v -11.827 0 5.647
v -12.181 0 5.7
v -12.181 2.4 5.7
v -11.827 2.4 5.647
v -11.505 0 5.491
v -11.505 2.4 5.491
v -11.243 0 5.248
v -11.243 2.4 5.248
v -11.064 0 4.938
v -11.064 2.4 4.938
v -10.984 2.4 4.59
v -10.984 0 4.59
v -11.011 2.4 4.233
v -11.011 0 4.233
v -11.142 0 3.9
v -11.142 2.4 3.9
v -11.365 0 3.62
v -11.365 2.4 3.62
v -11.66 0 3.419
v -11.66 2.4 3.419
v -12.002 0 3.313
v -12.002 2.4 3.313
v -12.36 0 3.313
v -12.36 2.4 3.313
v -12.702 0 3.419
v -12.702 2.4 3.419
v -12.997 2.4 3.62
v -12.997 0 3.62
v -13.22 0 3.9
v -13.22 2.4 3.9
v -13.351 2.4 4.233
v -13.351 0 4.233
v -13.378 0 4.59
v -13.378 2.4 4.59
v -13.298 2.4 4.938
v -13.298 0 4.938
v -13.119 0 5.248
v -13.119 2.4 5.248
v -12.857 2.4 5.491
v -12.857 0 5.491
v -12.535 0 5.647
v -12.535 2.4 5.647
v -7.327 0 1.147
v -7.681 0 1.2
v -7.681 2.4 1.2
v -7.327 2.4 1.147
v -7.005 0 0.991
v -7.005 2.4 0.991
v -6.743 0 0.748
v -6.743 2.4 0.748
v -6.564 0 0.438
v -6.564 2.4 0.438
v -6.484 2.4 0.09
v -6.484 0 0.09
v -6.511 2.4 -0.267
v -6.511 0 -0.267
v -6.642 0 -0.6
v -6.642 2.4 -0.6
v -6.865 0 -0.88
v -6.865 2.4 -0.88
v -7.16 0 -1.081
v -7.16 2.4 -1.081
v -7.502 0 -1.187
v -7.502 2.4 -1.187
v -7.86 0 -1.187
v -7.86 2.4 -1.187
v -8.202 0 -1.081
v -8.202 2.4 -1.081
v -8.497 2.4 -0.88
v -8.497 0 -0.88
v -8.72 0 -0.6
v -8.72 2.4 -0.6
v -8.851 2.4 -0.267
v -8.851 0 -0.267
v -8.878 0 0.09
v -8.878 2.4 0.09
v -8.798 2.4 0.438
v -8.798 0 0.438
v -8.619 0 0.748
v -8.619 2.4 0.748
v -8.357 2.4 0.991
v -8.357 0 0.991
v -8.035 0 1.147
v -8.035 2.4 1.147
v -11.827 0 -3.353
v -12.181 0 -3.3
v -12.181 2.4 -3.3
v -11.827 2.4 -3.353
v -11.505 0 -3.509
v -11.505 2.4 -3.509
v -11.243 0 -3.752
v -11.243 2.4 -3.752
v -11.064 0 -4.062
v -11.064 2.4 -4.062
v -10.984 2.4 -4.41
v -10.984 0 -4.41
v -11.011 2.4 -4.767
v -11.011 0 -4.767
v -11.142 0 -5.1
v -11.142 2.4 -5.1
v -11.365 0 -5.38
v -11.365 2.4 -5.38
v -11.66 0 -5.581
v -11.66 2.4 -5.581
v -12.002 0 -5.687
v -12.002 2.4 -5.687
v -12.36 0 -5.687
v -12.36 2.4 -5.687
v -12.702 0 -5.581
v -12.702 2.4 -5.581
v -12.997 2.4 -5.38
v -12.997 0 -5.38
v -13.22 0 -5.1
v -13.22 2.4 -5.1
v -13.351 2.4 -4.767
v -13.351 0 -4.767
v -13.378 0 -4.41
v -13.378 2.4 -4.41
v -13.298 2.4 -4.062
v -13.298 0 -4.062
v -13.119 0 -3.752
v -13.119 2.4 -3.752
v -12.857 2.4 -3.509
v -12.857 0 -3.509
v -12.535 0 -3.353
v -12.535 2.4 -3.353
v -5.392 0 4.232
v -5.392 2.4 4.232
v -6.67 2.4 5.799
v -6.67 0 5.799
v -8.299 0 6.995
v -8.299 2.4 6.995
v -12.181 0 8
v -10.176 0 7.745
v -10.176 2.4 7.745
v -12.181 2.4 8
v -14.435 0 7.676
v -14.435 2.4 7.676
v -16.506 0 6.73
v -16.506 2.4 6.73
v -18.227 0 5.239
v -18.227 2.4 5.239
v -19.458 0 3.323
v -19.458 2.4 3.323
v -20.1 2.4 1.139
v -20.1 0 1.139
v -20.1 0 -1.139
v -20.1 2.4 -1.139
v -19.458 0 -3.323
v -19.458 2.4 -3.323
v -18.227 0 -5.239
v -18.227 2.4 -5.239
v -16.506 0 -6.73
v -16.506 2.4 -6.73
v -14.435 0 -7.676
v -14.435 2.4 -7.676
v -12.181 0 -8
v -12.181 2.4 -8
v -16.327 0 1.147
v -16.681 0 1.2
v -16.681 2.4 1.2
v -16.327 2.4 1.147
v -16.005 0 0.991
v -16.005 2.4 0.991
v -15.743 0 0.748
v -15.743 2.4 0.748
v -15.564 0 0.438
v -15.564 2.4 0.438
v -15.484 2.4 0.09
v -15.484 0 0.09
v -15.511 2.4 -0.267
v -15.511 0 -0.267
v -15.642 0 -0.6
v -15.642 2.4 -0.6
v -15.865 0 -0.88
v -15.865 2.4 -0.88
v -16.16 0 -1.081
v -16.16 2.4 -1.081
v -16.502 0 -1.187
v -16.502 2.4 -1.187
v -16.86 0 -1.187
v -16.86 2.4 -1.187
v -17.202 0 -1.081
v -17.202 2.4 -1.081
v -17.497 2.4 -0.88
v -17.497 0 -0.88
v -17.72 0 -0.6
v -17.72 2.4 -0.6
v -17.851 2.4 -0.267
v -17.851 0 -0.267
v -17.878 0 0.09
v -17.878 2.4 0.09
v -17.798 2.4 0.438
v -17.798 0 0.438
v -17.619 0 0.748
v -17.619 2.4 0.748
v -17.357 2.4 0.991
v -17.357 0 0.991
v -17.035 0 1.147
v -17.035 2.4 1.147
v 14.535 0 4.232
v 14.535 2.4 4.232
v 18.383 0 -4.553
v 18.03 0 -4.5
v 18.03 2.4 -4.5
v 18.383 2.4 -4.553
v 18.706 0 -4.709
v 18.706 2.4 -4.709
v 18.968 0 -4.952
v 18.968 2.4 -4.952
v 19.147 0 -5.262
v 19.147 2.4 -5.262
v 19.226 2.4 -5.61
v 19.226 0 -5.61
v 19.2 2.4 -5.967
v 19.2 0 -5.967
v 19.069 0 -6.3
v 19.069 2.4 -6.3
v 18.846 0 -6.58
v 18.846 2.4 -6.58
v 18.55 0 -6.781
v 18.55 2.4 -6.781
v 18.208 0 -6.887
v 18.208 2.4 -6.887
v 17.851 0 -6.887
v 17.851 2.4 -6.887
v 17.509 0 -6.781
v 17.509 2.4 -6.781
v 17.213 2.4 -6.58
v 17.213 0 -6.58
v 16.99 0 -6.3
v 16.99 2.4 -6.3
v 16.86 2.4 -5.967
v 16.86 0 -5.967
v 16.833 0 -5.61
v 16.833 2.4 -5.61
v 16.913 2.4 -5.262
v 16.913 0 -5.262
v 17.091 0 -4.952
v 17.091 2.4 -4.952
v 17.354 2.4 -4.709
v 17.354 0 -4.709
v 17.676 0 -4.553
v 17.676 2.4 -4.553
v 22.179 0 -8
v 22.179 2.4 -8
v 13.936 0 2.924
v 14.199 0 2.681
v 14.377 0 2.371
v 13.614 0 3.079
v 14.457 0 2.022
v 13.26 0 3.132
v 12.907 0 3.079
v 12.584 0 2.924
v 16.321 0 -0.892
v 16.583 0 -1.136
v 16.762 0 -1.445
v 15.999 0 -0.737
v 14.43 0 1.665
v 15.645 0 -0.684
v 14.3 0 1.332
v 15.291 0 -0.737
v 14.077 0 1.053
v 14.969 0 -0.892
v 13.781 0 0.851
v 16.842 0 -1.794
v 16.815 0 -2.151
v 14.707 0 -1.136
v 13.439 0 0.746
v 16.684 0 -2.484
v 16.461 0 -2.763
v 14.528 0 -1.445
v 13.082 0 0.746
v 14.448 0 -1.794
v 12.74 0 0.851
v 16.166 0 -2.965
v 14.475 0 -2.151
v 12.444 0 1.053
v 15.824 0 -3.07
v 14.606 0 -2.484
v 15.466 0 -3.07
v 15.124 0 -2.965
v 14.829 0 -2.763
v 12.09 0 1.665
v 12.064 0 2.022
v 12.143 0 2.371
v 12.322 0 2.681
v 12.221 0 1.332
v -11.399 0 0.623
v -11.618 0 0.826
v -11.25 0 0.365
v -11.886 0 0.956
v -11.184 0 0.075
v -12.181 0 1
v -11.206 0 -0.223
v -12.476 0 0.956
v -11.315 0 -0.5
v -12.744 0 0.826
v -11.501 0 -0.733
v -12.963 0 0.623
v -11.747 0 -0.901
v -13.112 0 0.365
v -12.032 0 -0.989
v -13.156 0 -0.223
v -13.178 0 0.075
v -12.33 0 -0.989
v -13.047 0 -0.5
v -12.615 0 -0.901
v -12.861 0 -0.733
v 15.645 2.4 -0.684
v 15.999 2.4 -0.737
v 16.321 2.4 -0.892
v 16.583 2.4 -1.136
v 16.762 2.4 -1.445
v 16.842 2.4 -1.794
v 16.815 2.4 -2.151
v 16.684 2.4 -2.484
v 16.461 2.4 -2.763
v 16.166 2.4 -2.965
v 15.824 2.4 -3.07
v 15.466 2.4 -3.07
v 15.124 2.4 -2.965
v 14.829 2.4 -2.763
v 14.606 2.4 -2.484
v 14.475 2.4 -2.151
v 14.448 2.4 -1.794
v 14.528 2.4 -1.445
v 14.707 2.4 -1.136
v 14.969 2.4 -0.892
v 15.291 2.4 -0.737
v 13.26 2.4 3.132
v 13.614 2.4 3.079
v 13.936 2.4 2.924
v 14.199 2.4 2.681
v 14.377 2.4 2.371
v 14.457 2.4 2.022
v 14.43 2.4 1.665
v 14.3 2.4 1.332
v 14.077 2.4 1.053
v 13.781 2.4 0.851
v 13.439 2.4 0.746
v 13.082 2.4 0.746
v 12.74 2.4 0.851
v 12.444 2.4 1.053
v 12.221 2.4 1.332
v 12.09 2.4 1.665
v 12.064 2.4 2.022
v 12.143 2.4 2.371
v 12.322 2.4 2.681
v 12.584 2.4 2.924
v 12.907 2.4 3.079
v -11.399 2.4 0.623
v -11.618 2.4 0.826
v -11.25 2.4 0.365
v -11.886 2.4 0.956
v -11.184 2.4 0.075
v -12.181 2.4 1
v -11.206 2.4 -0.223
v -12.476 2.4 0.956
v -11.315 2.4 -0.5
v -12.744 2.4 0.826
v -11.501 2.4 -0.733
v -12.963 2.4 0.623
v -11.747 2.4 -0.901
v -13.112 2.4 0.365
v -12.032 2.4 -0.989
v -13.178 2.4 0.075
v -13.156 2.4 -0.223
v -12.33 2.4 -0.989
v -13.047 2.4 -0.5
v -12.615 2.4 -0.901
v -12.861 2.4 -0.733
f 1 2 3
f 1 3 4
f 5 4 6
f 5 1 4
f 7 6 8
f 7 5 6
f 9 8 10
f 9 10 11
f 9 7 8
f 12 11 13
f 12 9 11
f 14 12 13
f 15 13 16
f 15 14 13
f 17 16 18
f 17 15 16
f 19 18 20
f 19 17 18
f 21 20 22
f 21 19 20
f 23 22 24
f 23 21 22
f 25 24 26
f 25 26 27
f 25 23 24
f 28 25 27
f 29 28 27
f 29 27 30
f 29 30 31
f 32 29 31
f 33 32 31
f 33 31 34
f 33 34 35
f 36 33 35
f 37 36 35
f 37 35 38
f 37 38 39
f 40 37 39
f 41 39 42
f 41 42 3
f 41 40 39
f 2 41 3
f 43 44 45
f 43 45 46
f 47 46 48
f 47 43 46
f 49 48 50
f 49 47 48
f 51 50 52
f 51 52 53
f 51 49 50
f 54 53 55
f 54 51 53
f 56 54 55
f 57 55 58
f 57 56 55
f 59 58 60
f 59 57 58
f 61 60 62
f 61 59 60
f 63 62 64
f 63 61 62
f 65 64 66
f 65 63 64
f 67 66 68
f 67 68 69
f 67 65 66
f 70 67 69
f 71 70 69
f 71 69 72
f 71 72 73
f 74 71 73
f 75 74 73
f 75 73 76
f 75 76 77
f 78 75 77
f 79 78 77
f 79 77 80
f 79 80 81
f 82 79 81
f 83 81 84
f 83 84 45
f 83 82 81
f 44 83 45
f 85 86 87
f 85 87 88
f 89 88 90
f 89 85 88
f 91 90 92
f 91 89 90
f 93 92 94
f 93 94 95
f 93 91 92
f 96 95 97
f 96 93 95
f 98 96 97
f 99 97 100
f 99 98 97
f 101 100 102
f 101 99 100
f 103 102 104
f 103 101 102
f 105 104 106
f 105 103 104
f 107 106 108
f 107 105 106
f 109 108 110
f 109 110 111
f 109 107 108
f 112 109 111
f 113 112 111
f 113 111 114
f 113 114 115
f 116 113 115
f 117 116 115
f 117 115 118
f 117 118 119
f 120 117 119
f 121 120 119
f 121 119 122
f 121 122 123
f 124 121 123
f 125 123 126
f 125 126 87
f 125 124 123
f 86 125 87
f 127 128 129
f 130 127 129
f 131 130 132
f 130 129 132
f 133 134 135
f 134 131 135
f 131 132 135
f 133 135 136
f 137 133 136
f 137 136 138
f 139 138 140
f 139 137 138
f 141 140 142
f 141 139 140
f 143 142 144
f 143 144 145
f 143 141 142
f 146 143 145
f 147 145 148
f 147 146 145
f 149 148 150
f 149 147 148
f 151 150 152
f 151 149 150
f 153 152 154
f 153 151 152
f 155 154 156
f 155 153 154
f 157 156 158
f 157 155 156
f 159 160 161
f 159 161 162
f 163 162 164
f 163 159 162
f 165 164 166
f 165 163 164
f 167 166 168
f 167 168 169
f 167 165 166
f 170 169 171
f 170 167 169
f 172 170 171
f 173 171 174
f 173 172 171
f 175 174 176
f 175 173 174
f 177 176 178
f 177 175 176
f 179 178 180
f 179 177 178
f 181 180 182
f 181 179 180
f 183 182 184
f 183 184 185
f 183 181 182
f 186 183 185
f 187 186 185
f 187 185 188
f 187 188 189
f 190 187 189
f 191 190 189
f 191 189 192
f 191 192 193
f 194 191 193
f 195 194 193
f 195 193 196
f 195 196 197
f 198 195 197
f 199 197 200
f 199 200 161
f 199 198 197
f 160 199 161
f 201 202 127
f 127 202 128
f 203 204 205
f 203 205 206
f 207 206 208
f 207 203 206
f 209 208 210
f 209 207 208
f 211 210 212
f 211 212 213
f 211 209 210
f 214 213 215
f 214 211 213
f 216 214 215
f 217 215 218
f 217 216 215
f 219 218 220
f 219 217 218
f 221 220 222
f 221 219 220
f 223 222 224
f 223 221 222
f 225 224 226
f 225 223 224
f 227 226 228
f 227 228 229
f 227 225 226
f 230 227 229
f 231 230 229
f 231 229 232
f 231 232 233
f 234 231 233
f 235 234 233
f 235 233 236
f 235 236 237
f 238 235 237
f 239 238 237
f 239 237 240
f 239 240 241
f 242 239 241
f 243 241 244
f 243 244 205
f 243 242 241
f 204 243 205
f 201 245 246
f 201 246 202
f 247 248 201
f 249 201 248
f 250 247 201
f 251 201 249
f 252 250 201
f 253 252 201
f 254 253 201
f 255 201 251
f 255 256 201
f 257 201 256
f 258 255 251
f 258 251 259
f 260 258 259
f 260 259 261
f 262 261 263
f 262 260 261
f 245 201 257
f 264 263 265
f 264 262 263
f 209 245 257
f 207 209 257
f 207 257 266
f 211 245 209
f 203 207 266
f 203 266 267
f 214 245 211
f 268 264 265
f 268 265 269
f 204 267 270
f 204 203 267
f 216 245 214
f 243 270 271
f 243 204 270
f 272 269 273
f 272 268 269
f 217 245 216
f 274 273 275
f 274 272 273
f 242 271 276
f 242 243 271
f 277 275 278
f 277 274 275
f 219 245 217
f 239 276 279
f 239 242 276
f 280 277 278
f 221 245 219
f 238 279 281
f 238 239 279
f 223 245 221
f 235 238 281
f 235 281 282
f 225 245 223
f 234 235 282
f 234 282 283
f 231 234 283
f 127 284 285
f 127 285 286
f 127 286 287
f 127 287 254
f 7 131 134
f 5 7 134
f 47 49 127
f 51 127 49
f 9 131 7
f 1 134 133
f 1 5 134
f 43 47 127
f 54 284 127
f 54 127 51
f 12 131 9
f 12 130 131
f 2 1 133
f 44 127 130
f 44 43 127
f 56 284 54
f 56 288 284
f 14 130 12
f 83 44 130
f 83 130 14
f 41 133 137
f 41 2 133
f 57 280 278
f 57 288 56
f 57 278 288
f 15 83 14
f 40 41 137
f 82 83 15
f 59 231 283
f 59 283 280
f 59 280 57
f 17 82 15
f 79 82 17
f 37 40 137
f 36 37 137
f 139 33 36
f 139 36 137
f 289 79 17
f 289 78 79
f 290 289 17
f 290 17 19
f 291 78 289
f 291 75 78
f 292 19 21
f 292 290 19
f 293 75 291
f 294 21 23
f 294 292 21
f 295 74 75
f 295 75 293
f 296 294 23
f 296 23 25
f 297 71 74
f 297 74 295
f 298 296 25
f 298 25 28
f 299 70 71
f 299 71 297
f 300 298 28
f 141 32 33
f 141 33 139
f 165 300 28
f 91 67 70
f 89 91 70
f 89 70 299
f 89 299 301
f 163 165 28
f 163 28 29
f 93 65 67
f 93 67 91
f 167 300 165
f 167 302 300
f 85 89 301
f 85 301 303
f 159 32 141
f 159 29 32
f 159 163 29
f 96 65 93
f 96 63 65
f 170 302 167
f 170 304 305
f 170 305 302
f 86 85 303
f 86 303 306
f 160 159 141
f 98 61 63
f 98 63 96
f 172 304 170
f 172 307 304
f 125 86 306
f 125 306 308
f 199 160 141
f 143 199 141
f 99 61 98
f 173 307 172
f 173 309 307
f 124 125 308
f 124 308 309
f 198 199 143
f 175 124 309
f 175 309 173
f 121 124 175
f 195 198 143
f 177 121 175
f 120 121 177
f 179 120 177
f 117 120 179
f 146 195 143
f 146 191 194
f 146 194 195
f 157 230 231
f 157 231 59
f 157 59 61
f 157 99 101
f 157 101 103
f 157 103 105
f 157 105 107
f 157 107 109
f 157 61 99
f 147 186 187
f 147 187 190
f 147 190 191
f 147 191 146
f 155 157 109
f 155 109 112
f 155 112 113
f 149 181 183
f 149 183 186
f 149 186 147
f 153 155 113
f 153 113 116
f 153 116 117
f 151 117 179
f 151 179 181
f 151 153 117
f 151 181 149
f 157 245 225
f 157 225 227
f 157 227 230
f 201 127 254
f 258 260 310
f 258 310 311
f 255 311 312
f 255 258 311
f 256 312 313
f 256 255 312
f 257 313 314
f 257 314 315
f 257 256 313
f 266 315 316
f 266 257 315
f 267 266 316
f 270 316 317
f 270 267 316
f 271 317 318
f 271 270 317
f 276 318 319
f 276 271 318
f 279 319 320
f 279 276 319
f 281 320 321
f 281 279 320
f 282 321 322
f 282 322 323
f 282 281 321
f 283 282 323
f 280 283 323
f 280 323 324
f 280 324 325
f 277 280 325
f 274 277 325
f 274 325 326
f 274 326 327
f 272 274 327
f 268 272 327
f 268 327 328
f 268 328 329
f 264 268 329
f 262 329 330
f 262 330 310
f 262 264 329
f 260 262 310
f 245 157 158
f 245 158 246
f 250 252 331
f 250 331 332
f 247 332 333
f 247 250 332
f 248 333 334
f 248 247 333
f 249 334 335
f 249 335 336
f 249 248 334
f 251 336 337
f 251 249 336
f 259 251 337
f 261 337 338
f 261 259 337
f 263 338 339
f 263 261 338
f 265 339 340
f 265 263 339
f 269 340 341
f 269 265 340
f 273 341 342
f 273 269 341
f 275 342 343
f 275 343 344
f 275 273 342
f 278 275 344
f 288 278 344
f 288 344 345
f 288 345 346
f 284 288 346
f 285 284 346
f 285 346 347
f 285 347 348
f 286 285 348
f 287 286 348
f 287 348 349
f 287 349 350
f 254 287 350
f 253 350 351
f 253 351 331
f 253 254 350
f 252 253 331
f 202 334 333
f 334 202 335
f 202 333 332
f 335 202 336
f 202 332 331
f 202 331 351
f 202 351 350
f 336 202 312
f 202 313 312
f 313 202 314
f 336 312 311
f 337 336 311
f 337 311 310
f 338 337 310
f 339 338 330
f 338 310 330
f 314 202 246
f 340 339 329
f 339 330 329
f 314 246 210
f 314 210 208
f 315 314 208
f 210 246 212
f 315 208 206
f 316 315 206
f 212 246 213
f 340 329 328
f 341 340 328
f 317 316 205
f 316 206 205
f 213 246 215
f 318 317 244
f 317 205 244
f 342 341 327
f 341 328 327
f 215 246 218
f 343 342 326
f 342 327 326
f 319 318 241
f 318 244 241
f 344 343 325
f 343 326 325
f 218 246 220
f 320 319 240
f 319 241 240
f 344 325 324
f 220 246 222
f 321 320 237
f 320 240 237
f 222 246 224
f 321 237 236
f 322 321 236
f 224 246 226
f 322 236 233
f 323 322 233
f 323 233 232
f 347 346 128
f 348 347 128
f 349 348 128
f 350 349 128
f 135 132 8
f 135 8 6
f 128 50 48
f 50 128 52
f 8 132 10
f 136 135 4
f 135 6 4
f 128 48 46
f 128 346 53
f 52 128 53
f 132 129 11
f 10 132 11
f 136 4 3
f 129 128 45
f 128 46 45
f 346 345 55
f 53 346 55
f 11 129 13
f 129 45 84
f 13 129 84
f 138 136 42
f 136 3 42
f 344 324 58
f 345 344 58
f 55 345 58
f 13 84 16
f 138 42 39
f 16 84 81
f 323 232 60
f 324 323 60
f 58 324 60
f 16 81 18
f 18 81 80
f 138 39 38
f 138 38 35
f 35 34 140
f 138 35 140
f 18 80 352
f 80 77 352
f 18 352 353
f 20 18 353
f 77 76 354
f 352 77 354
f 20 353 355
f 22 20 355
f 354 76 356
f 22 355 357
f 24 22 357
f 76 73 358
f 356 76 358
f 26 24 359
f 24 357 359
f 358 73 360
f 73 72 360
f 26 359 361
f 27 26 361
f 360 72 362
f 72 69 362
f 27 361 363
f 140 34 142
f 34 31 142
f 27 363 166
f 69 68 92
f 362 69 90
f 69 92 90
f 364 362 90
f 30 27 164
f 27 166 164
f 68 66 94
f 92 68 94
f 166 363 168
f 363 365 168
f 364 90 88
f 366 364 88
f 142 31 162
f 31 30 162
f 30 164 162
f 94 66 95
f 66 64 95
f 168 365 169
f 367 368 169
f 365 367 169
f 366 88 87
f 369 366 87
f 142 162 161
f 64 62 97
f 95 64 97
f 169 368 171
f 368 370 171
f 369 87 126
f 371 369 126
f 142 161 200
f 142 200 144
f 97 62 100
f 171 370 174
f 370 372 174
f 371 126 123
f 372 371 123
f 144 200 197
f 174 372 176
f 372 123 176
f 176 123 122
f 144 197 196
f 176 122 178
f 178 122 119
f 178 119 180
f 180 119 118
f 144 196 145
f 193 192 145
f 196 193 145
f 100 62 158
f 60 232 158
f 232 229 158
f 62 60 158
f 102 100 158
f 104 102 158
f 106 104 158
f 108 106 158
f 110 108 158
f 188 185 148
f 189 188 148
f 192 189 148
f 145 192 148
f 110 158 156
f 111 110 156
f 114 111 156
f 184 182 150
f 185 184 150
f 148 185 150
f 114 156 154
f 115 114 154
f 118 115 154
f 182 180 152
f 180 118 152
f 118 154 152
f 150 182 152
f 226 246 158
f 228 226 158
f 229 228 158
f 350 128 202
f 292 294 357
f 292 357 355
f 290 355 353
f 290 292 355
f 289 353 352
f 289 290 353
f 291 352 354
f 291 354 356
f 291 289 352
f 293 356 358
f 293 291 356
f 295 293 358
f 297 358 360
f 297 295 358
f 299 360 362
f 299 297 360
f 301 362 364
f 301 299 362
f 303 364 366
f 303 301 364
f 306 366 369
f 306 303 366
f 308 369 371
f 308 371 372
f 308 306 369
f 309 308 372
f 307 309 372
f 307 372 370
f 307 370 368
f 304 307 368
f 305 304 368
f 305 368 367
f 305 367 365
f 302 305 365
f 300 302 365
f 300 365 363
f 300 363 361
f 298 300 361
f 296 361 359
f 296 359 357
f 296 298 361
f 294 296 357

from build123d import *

# Parameters (mm, degrees)
SKETCH1_R           = 1.2
SKETCH1_R_2         = 1
BOSS_EXTRUDE1_DEPTH = 2.4
CUT_EXTRUDE1_DEPTH  = 24.69949444


with BuildPart() as part:
    # Sketch1 → Boss-Extrude1 (new body)
    with BuildSketch(Plane(origin=(0, 0, 0), x_dir=(1, 0, 0), z_dir=(0, 1, 0))):
        with BuildLine():
            Line((-12.181045185, 8), (22.178954815, 8))
            Line((22.178954815, 8), (12.181045185, -8))
            Line((12.181045185, -8), (-12.181045185, -8))
            ThreePointArc((-12.181045185, -8), (-20.181045185, 0), (-12.181045185, 8))
        make_face()
        with Locations(Location((-12.181045185, 4.5, 0), (0, 0, 270))):
            Circle(SKETCH1_R, mode=Mode.SUBTRACT)
        with Locations(Location((-7.681045185, 0, 0), (0, 0, 270))):
            Circle(SKETCH1_R, mode=Mode.SUBTRACT)
        with Locations(Location((-12.181045185, -4.5, 0), (0, 0, 270))):
            Circle(SKETCH1_R, mode=Mode.SUBTRACT)
        with Locations(Location((-16.681045185, 0, 0), (0, 0, 270))):
            Circle(SKETCH1_R, mode=Mode.SUBTRACT)
        with Locations(Location((18.029644978, 5.7, 0), (0, 0, 270))):
            Circle(SKETCH1_R, mode=Mode.SUBTRACT)
        with Locations(Location((13.2603716, -1.932432865, 0), (0, 0, 270))):
            Circle(SKETCH1_R, mode=Mode.SUBTRACT)
        with Locations(Location((15.645008289, 1.883783567, 0), (0, 0, 270))):
            Circle(SKETCH1_R, mode=Mode.SUBTRACT)
        with Locations(Location((-12.181045185, 0, 0), (0, 0, 270))):
            Circle(SKETCH1_R_2, mode=Mode.SUBTRACT)
    extrude(amount=BOSS_EXTRUDE1_DEPTH)

    # Sketch2 → Cut-Extrude1 (cut, through all)
    with BuildSketch(Plane(origin=(0, 2.4, 0), x_dir=(1, 0, 0), z_dir=(0, 1, 0))):
        with BuildLine():
            Line((14.535282418, -4.232432865), (-5.392340445, -4.232432865))
            ThreePointArc((-5.392340445, -4.232432865), (-8.299000809, -6.994979018), (-12.181045185, -8))
            Line((-12.181045185, -8), (12.181045185, -8))
            Line((12.181045185, -8), (14.535282418, -4.232432865))
        make_face()
    extrude(amount=-CUT_EXTRUDE1_DEPTH, mode=Mode.SUBTRACT)


solid = part.part
